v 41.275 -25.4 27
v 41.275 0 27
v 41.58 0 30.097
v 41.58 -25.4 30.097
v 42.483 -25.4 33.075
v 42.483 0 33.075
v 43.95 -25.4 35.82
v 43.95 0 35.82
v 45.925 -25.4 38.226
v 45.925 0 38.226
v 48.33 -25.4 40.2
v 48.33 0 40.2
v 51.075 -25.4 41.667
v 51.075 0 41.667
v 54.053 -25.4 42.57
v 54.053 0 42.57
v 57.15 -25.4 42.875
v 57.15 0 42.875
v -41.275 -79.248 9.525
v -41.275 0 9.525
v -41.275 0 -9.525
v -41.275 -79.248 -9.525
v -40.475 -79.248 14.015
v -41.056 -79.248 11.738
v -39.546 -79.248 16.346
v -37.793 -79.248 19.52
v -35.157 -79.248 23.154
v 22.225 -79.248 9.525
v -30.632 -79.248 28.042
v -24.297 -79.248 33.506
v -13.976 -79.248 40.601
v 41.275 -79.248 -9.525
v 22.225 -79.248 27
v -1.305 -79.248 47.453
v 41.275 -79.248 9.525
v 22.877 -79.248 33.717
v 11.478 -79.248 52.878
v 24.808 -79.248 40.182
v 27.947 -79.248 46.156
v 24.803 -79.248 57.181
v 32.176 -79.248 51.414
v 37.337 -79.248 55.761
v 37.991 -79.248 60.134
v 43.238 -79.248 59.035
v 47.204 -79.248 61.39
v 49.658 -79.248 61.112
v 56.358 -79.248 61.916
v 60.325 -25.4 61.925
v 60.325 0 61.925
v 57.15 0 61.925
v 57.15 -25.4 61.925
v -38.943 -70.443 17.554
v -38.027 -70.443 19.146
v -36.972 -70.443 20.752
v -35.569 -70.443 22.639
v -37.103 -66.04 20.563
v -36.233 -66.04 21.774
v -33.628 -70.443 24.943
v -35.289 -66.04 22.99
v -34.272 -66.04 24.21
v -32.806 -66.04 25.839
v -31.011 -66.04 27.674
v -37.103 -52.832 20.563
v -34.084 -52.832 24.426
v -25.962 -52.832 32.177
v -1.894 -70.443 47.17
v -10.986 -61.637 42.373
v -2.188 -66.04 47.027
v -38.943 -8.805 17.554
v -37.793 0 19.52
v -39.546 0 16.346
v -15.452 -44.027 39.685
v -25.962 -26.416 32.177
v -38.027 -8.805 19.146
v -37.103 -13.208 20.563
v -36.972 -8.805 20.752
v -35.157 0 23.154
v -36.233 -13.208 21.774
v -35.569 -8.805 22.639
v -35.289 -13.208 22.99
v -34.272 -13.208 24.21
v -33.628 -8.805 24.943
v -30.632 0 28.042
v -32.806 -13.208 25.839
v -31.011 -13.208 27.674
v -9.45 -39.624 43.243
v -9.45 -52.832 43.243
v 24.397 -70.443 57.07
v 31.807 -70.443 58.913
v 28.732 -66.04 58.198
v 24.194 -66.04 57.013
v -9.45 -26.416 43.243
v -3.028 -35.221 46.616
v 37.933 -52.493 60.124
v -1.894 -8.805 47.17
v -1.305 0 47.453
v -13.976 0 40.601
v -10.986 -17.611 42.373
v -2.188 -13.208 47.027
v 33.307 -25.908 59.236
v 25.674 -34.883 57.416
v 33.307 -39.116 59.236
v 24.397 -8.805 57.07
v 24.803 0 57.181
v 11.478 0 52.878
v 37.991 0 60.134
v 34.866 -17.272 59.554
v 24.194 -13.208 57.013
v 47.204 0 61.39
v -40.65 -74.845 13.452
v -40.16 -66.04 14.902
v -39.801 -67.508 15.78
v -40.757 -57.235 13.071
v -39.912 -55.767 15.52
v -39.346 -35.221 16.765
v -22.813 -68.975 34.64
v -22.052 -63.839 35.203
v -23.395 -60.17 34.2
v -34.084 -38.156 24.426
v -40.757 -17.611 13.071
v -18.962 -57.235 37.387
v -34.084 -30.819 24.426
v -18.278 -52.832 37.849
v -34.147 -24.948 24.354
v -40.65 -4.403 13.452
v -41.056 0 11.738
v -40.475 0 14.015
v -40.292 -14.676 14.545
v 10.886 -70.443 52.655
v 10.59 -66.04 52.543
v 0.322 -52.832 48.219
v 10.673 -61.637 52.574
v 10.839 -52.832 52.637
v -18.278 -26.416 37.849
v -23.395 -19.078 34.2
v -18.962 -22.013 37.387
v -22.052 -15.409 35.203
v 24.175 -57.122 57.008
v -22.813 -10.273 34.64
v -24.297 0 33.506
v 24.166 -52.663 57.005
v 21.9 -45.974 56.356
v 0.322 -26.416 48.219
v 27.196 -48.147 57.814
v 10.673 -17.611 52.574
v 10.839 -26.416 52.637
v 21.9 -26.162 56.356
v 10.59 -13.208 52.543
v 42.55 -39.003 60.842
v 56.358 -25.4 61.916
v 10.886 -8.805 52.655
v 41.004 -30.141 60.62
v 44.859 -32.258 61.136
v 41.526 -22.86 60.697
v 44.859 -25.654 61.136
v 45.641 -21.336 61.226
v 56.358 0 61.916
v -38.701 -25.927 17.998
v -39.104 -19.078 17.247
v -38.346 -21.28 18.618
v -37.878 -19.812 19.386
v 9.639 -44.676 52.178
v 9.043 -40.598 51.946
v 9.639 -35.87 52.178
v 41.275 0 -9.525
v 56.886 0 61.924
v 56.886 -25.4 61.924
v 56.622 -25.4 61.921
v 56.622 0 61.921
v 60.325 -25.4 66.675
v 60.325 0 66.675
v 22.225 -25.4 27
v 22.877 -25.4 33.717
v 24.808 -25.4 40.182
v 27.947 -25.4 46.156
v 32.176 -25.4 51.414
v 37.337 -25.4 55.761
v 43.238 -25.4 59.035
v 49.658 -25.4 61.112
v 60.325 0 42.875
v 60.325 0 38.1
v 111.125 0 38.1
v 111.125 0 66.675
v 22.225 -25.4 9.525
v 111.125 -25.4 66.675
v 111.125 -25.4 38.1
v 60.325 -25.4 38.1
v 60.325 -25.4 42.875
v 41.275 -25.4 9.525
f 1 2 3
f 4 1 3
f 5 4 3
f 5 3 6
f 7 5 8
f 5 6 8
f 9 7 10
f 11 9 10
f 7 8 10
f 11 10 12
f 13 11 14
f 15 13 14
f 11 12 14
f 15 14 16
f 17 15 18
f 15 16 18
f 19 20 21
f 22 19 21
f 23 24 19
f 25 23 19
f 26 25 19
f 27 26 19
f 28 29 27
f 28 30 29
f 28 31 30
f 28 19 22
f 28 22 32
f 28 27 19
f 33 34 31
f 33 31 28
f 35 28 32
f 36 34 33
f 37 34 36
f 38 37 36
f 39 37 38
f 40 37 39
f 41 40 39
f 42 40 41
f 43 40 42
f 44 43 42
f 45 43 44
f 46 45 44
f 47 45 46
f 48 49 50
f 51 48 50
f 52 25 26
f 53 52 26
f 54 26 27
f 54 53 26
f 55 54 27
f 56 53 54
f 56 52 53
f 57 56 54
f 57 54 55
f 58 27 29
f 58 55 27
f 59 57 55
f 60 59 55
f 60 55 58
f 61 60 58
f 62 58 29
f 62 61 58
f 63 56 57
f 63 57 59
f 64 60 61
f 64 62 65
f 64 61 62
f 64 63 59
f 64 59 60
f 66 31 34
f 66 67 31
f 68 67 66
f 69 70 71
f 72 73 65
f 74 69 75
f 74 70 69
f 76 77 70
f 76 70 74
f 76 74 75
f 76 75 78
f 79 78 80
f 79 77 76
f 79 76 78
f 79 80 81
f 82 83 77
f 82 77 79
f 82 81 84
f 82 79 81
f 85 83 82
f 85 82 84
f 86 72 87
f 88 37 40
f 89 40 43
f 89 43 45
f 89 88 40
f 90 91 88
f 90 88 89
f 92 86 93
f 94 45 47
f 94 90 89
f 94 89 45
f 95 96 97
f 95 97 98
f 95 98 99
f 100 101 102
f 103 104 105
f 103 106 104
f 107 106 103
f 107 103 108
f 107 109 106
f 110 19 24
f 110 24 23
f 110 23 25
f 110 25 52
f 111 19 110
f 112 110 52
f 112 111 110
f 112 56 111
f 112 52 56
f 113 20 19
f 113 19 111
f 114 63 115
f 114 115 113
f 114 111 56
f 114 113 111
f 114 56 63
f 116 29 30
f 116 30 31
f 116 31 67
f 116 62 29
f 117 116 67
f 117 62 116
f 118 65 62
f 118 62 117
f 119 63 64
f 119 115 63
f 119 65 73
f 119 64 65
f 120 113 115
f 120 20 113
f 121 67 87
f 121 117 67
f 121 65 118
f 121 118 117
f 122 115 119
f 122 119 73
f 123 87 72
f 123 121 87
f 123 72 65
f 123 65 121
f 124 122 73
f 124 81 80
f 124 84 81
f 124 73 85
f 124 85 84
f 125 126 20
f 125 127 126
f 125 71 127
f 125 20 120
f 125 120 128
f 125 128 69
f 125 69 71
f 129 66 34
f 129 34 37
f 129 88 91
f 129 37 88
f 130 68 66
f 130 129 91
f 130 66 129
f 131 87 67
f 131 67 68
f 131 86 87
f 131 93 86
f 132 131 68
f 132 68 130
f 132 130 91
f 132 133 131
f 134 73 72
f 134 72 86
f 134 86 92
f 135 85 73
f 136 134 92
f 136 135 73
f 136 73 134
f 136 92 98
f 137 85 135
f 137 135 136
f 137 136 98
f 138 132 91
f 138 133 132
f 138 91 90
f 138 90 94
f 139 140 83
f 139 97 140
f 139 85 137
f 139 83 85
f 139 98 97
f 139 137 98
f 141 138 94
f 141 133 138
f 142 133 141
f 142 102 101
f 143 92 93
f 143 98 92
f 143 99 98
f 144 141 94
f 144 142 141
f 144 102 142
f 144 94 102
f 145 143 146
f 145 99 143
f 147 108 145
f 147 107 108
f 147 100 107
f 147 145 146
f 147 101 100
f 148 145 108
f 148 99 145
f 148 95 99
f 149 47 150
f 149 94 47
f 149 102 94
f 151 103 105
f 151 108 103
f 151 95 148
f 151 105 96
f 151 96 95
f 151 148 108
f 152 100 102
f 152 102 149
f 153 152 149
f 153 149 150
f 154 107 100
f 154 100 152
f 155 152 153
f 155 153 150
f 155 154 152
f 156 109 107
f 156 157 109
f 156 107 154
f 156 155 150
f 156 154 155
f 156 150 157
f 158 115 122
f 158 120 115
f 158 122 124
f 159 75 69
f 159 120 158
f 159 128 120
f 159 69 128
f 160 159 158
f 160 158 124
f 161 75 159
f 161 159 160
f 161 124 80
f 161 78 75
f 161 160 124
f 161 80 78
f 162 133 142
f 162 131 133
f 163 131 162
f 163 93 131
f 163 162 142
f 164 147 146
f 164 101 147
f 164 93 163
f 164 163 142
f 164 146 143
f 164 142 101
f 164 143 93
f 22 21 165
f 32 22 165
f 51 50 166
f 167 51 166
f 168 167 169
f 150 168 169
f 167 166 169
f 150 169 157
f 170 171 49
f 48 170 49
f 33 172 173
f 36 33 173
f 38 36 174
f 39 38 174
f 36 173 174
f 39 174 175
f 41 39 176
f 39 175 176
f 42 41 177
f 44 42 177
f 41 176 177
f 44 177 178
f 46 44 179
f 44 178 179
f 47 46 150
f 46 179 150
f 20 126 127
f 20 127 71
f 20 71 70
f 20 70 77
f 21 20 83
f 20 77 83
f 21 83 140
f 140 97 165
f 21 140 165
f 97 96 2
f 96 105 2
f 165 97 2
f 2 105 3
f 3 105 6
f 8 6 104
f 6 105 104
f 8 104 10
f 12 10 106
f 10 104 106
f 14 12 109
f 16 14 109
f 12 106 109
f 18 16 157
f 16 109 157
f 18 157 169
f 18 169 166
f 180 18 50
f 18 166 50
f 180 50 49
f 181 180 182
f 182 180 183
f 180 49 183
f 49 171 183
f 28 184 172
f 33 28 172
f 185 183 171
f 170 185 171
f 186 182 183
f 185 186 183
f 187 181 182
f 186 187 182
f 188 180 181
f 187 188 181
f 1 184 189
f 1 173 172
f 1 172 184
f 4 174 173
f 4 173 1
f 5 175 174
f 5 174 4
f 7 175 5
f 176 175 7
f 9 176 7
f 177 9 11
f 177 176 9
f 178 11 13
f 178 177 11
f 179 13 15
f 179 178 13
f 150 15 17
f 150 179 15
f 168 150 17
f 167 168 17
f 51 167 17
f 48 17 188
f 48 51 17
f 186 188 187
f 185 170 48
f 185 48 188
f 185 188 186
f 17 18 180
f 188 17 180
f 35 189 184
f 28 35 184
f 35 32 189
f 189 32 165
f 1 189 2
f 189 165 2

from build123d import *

# Parameters (mm, degrees)
F2_DEPTH = 79.248
F0_W     = 25.4
F0_H     = 19.0499988828
F3_DEPTH = 25.4


with BuildPart() as f2:
    # F0 (on Front) → F2 (new body)
    with BuildSketch(Plane.XZ):
        Polygon((41.275, -9.525), (41.275, 9.525), (22.2250011172, 9.525), (-41.275, 9.525), (-41.275, -9.525), align=None)
        with BuildLine():
            Line((-41.275, 9.525), (22.2250011172, 9.525))
            Line((22.2250011172, 9.525), (22.2250011172, 27.0002))
            ThreePointArc((22.2250011172, 27.0002), (32.1759573239, 51.4143913521), (56.358301529, 61.9162244085))
            add(Edge.make_bspline(
                [(-41.275, 9.525), (-40.962193468, 30.2773661311), (10.7351419733, 61.2238694952), (56.358301529, 61.9162244085)],
                knots=[0, 0, 0, 0, 110.8627649737, 110.8627649737, 110.8627649737, 110.8627649737], degree=3))
        make_face()
    extrude(amount=F2_DEPTH)

    # F0 (on Front) → F3 (join)
    with BuildSketch(Plane.XZ):
        Polygon((41.275, -9.525), (41.275, 9.525), (22.2250011172, 9.525), (-41.275, 9.525), (-41.275, -9.525), align=None)
        with BuildLine():
            Line((22.2250011172, 9.525), (41.275, 9.525))
            Line((41.275, 9.525), (41.275, 27.0002))
            ThreePointArc((41.275, 27.0002), (45.9246798487, 38.2255201513), (57.15, 42.8752))
            Line((57.15, 42.8752), (60.325, 42.8752))
            Line((60.325, 42.8752), (60.325, 61.9251988828))
            Line((60.325, 61.9251988828), (57.15, 61.9251988828))
            add(Edge.make_bspline(
                [(56.358301529, 61.9162244085), (56.622408287, 61.9202323644), (56.8863114928, 61.9232264714), (57.15, 61.9251988828)],
                knots=[110.8627649737, 110.8627649737, 110.8627649737, 110.8627649737, 111.5045356385, 111.5045356385, 111.5045356385, 111.5045356385], degree=3))
            ThreePointArc((56.358301529, 61.9162244085), (32.1759573239, 51.4143913521), (22.2250011172, 27.0002))
            Line((22.2250011172, 27.0002), (22.2250011172, 9.525))
        make_face()
        with BuildLine():
            Line((-41.275, 9.525), (22.2250011172, 9.525))
            Line((22.2250011172, 9.525), (22.2250011172, 27.0002))
            ThreePointArc((22.2250011172, 27.0002), (32.1759573239, 51.4143913521), (56.358301529, 61.9162244085))
            add(Edge.make_bspline(
                [(-41.275, 9.525), (-40.962193468, 30.2773661311), (10.7351419733, 61.2238694952), (56.358301529, 61.9162244085)],
                knots=[0, 0, 0, 0, 110.8627649737, 110.8627649737, 110.8627649737, 110.8627649737], degree=3))
        make_face()
        with BuildLine():
            ThreePointArc((57.15, 61.9251988828), (56.7541253323, 61.9229551922), (56.358301529, 61.9162244085))
            add(Edge.make_bspline(
                [(56.358301529, 61.9162244085), (56.622408287, 61.9202323644), (56.8863114928, 61.9232264714), (57.15, 61.9251988828)],
                knots=[110.8627649737, 110.8627649737, 110.8627649737, 110.8627649737, 111.5045356385, 111.5045356385, 111.5045356385, 111.5045356385], degree=3))
        make_face()
        Polygon((85.725, 42.8752), (60.325, 42.8752), (60.325, 38.1), (111.125, 38.1), (111.125, 66.675), (60.325, 66.675), (60.325, 61.9251988828), (85.725, 61.9251988828), align=None)
        with Locations((73.025, 52.4001994414)):
            Rectangle(F0_W, F0_H)
    extrude(amount=F3_DEPTH)


solid = f2.part
